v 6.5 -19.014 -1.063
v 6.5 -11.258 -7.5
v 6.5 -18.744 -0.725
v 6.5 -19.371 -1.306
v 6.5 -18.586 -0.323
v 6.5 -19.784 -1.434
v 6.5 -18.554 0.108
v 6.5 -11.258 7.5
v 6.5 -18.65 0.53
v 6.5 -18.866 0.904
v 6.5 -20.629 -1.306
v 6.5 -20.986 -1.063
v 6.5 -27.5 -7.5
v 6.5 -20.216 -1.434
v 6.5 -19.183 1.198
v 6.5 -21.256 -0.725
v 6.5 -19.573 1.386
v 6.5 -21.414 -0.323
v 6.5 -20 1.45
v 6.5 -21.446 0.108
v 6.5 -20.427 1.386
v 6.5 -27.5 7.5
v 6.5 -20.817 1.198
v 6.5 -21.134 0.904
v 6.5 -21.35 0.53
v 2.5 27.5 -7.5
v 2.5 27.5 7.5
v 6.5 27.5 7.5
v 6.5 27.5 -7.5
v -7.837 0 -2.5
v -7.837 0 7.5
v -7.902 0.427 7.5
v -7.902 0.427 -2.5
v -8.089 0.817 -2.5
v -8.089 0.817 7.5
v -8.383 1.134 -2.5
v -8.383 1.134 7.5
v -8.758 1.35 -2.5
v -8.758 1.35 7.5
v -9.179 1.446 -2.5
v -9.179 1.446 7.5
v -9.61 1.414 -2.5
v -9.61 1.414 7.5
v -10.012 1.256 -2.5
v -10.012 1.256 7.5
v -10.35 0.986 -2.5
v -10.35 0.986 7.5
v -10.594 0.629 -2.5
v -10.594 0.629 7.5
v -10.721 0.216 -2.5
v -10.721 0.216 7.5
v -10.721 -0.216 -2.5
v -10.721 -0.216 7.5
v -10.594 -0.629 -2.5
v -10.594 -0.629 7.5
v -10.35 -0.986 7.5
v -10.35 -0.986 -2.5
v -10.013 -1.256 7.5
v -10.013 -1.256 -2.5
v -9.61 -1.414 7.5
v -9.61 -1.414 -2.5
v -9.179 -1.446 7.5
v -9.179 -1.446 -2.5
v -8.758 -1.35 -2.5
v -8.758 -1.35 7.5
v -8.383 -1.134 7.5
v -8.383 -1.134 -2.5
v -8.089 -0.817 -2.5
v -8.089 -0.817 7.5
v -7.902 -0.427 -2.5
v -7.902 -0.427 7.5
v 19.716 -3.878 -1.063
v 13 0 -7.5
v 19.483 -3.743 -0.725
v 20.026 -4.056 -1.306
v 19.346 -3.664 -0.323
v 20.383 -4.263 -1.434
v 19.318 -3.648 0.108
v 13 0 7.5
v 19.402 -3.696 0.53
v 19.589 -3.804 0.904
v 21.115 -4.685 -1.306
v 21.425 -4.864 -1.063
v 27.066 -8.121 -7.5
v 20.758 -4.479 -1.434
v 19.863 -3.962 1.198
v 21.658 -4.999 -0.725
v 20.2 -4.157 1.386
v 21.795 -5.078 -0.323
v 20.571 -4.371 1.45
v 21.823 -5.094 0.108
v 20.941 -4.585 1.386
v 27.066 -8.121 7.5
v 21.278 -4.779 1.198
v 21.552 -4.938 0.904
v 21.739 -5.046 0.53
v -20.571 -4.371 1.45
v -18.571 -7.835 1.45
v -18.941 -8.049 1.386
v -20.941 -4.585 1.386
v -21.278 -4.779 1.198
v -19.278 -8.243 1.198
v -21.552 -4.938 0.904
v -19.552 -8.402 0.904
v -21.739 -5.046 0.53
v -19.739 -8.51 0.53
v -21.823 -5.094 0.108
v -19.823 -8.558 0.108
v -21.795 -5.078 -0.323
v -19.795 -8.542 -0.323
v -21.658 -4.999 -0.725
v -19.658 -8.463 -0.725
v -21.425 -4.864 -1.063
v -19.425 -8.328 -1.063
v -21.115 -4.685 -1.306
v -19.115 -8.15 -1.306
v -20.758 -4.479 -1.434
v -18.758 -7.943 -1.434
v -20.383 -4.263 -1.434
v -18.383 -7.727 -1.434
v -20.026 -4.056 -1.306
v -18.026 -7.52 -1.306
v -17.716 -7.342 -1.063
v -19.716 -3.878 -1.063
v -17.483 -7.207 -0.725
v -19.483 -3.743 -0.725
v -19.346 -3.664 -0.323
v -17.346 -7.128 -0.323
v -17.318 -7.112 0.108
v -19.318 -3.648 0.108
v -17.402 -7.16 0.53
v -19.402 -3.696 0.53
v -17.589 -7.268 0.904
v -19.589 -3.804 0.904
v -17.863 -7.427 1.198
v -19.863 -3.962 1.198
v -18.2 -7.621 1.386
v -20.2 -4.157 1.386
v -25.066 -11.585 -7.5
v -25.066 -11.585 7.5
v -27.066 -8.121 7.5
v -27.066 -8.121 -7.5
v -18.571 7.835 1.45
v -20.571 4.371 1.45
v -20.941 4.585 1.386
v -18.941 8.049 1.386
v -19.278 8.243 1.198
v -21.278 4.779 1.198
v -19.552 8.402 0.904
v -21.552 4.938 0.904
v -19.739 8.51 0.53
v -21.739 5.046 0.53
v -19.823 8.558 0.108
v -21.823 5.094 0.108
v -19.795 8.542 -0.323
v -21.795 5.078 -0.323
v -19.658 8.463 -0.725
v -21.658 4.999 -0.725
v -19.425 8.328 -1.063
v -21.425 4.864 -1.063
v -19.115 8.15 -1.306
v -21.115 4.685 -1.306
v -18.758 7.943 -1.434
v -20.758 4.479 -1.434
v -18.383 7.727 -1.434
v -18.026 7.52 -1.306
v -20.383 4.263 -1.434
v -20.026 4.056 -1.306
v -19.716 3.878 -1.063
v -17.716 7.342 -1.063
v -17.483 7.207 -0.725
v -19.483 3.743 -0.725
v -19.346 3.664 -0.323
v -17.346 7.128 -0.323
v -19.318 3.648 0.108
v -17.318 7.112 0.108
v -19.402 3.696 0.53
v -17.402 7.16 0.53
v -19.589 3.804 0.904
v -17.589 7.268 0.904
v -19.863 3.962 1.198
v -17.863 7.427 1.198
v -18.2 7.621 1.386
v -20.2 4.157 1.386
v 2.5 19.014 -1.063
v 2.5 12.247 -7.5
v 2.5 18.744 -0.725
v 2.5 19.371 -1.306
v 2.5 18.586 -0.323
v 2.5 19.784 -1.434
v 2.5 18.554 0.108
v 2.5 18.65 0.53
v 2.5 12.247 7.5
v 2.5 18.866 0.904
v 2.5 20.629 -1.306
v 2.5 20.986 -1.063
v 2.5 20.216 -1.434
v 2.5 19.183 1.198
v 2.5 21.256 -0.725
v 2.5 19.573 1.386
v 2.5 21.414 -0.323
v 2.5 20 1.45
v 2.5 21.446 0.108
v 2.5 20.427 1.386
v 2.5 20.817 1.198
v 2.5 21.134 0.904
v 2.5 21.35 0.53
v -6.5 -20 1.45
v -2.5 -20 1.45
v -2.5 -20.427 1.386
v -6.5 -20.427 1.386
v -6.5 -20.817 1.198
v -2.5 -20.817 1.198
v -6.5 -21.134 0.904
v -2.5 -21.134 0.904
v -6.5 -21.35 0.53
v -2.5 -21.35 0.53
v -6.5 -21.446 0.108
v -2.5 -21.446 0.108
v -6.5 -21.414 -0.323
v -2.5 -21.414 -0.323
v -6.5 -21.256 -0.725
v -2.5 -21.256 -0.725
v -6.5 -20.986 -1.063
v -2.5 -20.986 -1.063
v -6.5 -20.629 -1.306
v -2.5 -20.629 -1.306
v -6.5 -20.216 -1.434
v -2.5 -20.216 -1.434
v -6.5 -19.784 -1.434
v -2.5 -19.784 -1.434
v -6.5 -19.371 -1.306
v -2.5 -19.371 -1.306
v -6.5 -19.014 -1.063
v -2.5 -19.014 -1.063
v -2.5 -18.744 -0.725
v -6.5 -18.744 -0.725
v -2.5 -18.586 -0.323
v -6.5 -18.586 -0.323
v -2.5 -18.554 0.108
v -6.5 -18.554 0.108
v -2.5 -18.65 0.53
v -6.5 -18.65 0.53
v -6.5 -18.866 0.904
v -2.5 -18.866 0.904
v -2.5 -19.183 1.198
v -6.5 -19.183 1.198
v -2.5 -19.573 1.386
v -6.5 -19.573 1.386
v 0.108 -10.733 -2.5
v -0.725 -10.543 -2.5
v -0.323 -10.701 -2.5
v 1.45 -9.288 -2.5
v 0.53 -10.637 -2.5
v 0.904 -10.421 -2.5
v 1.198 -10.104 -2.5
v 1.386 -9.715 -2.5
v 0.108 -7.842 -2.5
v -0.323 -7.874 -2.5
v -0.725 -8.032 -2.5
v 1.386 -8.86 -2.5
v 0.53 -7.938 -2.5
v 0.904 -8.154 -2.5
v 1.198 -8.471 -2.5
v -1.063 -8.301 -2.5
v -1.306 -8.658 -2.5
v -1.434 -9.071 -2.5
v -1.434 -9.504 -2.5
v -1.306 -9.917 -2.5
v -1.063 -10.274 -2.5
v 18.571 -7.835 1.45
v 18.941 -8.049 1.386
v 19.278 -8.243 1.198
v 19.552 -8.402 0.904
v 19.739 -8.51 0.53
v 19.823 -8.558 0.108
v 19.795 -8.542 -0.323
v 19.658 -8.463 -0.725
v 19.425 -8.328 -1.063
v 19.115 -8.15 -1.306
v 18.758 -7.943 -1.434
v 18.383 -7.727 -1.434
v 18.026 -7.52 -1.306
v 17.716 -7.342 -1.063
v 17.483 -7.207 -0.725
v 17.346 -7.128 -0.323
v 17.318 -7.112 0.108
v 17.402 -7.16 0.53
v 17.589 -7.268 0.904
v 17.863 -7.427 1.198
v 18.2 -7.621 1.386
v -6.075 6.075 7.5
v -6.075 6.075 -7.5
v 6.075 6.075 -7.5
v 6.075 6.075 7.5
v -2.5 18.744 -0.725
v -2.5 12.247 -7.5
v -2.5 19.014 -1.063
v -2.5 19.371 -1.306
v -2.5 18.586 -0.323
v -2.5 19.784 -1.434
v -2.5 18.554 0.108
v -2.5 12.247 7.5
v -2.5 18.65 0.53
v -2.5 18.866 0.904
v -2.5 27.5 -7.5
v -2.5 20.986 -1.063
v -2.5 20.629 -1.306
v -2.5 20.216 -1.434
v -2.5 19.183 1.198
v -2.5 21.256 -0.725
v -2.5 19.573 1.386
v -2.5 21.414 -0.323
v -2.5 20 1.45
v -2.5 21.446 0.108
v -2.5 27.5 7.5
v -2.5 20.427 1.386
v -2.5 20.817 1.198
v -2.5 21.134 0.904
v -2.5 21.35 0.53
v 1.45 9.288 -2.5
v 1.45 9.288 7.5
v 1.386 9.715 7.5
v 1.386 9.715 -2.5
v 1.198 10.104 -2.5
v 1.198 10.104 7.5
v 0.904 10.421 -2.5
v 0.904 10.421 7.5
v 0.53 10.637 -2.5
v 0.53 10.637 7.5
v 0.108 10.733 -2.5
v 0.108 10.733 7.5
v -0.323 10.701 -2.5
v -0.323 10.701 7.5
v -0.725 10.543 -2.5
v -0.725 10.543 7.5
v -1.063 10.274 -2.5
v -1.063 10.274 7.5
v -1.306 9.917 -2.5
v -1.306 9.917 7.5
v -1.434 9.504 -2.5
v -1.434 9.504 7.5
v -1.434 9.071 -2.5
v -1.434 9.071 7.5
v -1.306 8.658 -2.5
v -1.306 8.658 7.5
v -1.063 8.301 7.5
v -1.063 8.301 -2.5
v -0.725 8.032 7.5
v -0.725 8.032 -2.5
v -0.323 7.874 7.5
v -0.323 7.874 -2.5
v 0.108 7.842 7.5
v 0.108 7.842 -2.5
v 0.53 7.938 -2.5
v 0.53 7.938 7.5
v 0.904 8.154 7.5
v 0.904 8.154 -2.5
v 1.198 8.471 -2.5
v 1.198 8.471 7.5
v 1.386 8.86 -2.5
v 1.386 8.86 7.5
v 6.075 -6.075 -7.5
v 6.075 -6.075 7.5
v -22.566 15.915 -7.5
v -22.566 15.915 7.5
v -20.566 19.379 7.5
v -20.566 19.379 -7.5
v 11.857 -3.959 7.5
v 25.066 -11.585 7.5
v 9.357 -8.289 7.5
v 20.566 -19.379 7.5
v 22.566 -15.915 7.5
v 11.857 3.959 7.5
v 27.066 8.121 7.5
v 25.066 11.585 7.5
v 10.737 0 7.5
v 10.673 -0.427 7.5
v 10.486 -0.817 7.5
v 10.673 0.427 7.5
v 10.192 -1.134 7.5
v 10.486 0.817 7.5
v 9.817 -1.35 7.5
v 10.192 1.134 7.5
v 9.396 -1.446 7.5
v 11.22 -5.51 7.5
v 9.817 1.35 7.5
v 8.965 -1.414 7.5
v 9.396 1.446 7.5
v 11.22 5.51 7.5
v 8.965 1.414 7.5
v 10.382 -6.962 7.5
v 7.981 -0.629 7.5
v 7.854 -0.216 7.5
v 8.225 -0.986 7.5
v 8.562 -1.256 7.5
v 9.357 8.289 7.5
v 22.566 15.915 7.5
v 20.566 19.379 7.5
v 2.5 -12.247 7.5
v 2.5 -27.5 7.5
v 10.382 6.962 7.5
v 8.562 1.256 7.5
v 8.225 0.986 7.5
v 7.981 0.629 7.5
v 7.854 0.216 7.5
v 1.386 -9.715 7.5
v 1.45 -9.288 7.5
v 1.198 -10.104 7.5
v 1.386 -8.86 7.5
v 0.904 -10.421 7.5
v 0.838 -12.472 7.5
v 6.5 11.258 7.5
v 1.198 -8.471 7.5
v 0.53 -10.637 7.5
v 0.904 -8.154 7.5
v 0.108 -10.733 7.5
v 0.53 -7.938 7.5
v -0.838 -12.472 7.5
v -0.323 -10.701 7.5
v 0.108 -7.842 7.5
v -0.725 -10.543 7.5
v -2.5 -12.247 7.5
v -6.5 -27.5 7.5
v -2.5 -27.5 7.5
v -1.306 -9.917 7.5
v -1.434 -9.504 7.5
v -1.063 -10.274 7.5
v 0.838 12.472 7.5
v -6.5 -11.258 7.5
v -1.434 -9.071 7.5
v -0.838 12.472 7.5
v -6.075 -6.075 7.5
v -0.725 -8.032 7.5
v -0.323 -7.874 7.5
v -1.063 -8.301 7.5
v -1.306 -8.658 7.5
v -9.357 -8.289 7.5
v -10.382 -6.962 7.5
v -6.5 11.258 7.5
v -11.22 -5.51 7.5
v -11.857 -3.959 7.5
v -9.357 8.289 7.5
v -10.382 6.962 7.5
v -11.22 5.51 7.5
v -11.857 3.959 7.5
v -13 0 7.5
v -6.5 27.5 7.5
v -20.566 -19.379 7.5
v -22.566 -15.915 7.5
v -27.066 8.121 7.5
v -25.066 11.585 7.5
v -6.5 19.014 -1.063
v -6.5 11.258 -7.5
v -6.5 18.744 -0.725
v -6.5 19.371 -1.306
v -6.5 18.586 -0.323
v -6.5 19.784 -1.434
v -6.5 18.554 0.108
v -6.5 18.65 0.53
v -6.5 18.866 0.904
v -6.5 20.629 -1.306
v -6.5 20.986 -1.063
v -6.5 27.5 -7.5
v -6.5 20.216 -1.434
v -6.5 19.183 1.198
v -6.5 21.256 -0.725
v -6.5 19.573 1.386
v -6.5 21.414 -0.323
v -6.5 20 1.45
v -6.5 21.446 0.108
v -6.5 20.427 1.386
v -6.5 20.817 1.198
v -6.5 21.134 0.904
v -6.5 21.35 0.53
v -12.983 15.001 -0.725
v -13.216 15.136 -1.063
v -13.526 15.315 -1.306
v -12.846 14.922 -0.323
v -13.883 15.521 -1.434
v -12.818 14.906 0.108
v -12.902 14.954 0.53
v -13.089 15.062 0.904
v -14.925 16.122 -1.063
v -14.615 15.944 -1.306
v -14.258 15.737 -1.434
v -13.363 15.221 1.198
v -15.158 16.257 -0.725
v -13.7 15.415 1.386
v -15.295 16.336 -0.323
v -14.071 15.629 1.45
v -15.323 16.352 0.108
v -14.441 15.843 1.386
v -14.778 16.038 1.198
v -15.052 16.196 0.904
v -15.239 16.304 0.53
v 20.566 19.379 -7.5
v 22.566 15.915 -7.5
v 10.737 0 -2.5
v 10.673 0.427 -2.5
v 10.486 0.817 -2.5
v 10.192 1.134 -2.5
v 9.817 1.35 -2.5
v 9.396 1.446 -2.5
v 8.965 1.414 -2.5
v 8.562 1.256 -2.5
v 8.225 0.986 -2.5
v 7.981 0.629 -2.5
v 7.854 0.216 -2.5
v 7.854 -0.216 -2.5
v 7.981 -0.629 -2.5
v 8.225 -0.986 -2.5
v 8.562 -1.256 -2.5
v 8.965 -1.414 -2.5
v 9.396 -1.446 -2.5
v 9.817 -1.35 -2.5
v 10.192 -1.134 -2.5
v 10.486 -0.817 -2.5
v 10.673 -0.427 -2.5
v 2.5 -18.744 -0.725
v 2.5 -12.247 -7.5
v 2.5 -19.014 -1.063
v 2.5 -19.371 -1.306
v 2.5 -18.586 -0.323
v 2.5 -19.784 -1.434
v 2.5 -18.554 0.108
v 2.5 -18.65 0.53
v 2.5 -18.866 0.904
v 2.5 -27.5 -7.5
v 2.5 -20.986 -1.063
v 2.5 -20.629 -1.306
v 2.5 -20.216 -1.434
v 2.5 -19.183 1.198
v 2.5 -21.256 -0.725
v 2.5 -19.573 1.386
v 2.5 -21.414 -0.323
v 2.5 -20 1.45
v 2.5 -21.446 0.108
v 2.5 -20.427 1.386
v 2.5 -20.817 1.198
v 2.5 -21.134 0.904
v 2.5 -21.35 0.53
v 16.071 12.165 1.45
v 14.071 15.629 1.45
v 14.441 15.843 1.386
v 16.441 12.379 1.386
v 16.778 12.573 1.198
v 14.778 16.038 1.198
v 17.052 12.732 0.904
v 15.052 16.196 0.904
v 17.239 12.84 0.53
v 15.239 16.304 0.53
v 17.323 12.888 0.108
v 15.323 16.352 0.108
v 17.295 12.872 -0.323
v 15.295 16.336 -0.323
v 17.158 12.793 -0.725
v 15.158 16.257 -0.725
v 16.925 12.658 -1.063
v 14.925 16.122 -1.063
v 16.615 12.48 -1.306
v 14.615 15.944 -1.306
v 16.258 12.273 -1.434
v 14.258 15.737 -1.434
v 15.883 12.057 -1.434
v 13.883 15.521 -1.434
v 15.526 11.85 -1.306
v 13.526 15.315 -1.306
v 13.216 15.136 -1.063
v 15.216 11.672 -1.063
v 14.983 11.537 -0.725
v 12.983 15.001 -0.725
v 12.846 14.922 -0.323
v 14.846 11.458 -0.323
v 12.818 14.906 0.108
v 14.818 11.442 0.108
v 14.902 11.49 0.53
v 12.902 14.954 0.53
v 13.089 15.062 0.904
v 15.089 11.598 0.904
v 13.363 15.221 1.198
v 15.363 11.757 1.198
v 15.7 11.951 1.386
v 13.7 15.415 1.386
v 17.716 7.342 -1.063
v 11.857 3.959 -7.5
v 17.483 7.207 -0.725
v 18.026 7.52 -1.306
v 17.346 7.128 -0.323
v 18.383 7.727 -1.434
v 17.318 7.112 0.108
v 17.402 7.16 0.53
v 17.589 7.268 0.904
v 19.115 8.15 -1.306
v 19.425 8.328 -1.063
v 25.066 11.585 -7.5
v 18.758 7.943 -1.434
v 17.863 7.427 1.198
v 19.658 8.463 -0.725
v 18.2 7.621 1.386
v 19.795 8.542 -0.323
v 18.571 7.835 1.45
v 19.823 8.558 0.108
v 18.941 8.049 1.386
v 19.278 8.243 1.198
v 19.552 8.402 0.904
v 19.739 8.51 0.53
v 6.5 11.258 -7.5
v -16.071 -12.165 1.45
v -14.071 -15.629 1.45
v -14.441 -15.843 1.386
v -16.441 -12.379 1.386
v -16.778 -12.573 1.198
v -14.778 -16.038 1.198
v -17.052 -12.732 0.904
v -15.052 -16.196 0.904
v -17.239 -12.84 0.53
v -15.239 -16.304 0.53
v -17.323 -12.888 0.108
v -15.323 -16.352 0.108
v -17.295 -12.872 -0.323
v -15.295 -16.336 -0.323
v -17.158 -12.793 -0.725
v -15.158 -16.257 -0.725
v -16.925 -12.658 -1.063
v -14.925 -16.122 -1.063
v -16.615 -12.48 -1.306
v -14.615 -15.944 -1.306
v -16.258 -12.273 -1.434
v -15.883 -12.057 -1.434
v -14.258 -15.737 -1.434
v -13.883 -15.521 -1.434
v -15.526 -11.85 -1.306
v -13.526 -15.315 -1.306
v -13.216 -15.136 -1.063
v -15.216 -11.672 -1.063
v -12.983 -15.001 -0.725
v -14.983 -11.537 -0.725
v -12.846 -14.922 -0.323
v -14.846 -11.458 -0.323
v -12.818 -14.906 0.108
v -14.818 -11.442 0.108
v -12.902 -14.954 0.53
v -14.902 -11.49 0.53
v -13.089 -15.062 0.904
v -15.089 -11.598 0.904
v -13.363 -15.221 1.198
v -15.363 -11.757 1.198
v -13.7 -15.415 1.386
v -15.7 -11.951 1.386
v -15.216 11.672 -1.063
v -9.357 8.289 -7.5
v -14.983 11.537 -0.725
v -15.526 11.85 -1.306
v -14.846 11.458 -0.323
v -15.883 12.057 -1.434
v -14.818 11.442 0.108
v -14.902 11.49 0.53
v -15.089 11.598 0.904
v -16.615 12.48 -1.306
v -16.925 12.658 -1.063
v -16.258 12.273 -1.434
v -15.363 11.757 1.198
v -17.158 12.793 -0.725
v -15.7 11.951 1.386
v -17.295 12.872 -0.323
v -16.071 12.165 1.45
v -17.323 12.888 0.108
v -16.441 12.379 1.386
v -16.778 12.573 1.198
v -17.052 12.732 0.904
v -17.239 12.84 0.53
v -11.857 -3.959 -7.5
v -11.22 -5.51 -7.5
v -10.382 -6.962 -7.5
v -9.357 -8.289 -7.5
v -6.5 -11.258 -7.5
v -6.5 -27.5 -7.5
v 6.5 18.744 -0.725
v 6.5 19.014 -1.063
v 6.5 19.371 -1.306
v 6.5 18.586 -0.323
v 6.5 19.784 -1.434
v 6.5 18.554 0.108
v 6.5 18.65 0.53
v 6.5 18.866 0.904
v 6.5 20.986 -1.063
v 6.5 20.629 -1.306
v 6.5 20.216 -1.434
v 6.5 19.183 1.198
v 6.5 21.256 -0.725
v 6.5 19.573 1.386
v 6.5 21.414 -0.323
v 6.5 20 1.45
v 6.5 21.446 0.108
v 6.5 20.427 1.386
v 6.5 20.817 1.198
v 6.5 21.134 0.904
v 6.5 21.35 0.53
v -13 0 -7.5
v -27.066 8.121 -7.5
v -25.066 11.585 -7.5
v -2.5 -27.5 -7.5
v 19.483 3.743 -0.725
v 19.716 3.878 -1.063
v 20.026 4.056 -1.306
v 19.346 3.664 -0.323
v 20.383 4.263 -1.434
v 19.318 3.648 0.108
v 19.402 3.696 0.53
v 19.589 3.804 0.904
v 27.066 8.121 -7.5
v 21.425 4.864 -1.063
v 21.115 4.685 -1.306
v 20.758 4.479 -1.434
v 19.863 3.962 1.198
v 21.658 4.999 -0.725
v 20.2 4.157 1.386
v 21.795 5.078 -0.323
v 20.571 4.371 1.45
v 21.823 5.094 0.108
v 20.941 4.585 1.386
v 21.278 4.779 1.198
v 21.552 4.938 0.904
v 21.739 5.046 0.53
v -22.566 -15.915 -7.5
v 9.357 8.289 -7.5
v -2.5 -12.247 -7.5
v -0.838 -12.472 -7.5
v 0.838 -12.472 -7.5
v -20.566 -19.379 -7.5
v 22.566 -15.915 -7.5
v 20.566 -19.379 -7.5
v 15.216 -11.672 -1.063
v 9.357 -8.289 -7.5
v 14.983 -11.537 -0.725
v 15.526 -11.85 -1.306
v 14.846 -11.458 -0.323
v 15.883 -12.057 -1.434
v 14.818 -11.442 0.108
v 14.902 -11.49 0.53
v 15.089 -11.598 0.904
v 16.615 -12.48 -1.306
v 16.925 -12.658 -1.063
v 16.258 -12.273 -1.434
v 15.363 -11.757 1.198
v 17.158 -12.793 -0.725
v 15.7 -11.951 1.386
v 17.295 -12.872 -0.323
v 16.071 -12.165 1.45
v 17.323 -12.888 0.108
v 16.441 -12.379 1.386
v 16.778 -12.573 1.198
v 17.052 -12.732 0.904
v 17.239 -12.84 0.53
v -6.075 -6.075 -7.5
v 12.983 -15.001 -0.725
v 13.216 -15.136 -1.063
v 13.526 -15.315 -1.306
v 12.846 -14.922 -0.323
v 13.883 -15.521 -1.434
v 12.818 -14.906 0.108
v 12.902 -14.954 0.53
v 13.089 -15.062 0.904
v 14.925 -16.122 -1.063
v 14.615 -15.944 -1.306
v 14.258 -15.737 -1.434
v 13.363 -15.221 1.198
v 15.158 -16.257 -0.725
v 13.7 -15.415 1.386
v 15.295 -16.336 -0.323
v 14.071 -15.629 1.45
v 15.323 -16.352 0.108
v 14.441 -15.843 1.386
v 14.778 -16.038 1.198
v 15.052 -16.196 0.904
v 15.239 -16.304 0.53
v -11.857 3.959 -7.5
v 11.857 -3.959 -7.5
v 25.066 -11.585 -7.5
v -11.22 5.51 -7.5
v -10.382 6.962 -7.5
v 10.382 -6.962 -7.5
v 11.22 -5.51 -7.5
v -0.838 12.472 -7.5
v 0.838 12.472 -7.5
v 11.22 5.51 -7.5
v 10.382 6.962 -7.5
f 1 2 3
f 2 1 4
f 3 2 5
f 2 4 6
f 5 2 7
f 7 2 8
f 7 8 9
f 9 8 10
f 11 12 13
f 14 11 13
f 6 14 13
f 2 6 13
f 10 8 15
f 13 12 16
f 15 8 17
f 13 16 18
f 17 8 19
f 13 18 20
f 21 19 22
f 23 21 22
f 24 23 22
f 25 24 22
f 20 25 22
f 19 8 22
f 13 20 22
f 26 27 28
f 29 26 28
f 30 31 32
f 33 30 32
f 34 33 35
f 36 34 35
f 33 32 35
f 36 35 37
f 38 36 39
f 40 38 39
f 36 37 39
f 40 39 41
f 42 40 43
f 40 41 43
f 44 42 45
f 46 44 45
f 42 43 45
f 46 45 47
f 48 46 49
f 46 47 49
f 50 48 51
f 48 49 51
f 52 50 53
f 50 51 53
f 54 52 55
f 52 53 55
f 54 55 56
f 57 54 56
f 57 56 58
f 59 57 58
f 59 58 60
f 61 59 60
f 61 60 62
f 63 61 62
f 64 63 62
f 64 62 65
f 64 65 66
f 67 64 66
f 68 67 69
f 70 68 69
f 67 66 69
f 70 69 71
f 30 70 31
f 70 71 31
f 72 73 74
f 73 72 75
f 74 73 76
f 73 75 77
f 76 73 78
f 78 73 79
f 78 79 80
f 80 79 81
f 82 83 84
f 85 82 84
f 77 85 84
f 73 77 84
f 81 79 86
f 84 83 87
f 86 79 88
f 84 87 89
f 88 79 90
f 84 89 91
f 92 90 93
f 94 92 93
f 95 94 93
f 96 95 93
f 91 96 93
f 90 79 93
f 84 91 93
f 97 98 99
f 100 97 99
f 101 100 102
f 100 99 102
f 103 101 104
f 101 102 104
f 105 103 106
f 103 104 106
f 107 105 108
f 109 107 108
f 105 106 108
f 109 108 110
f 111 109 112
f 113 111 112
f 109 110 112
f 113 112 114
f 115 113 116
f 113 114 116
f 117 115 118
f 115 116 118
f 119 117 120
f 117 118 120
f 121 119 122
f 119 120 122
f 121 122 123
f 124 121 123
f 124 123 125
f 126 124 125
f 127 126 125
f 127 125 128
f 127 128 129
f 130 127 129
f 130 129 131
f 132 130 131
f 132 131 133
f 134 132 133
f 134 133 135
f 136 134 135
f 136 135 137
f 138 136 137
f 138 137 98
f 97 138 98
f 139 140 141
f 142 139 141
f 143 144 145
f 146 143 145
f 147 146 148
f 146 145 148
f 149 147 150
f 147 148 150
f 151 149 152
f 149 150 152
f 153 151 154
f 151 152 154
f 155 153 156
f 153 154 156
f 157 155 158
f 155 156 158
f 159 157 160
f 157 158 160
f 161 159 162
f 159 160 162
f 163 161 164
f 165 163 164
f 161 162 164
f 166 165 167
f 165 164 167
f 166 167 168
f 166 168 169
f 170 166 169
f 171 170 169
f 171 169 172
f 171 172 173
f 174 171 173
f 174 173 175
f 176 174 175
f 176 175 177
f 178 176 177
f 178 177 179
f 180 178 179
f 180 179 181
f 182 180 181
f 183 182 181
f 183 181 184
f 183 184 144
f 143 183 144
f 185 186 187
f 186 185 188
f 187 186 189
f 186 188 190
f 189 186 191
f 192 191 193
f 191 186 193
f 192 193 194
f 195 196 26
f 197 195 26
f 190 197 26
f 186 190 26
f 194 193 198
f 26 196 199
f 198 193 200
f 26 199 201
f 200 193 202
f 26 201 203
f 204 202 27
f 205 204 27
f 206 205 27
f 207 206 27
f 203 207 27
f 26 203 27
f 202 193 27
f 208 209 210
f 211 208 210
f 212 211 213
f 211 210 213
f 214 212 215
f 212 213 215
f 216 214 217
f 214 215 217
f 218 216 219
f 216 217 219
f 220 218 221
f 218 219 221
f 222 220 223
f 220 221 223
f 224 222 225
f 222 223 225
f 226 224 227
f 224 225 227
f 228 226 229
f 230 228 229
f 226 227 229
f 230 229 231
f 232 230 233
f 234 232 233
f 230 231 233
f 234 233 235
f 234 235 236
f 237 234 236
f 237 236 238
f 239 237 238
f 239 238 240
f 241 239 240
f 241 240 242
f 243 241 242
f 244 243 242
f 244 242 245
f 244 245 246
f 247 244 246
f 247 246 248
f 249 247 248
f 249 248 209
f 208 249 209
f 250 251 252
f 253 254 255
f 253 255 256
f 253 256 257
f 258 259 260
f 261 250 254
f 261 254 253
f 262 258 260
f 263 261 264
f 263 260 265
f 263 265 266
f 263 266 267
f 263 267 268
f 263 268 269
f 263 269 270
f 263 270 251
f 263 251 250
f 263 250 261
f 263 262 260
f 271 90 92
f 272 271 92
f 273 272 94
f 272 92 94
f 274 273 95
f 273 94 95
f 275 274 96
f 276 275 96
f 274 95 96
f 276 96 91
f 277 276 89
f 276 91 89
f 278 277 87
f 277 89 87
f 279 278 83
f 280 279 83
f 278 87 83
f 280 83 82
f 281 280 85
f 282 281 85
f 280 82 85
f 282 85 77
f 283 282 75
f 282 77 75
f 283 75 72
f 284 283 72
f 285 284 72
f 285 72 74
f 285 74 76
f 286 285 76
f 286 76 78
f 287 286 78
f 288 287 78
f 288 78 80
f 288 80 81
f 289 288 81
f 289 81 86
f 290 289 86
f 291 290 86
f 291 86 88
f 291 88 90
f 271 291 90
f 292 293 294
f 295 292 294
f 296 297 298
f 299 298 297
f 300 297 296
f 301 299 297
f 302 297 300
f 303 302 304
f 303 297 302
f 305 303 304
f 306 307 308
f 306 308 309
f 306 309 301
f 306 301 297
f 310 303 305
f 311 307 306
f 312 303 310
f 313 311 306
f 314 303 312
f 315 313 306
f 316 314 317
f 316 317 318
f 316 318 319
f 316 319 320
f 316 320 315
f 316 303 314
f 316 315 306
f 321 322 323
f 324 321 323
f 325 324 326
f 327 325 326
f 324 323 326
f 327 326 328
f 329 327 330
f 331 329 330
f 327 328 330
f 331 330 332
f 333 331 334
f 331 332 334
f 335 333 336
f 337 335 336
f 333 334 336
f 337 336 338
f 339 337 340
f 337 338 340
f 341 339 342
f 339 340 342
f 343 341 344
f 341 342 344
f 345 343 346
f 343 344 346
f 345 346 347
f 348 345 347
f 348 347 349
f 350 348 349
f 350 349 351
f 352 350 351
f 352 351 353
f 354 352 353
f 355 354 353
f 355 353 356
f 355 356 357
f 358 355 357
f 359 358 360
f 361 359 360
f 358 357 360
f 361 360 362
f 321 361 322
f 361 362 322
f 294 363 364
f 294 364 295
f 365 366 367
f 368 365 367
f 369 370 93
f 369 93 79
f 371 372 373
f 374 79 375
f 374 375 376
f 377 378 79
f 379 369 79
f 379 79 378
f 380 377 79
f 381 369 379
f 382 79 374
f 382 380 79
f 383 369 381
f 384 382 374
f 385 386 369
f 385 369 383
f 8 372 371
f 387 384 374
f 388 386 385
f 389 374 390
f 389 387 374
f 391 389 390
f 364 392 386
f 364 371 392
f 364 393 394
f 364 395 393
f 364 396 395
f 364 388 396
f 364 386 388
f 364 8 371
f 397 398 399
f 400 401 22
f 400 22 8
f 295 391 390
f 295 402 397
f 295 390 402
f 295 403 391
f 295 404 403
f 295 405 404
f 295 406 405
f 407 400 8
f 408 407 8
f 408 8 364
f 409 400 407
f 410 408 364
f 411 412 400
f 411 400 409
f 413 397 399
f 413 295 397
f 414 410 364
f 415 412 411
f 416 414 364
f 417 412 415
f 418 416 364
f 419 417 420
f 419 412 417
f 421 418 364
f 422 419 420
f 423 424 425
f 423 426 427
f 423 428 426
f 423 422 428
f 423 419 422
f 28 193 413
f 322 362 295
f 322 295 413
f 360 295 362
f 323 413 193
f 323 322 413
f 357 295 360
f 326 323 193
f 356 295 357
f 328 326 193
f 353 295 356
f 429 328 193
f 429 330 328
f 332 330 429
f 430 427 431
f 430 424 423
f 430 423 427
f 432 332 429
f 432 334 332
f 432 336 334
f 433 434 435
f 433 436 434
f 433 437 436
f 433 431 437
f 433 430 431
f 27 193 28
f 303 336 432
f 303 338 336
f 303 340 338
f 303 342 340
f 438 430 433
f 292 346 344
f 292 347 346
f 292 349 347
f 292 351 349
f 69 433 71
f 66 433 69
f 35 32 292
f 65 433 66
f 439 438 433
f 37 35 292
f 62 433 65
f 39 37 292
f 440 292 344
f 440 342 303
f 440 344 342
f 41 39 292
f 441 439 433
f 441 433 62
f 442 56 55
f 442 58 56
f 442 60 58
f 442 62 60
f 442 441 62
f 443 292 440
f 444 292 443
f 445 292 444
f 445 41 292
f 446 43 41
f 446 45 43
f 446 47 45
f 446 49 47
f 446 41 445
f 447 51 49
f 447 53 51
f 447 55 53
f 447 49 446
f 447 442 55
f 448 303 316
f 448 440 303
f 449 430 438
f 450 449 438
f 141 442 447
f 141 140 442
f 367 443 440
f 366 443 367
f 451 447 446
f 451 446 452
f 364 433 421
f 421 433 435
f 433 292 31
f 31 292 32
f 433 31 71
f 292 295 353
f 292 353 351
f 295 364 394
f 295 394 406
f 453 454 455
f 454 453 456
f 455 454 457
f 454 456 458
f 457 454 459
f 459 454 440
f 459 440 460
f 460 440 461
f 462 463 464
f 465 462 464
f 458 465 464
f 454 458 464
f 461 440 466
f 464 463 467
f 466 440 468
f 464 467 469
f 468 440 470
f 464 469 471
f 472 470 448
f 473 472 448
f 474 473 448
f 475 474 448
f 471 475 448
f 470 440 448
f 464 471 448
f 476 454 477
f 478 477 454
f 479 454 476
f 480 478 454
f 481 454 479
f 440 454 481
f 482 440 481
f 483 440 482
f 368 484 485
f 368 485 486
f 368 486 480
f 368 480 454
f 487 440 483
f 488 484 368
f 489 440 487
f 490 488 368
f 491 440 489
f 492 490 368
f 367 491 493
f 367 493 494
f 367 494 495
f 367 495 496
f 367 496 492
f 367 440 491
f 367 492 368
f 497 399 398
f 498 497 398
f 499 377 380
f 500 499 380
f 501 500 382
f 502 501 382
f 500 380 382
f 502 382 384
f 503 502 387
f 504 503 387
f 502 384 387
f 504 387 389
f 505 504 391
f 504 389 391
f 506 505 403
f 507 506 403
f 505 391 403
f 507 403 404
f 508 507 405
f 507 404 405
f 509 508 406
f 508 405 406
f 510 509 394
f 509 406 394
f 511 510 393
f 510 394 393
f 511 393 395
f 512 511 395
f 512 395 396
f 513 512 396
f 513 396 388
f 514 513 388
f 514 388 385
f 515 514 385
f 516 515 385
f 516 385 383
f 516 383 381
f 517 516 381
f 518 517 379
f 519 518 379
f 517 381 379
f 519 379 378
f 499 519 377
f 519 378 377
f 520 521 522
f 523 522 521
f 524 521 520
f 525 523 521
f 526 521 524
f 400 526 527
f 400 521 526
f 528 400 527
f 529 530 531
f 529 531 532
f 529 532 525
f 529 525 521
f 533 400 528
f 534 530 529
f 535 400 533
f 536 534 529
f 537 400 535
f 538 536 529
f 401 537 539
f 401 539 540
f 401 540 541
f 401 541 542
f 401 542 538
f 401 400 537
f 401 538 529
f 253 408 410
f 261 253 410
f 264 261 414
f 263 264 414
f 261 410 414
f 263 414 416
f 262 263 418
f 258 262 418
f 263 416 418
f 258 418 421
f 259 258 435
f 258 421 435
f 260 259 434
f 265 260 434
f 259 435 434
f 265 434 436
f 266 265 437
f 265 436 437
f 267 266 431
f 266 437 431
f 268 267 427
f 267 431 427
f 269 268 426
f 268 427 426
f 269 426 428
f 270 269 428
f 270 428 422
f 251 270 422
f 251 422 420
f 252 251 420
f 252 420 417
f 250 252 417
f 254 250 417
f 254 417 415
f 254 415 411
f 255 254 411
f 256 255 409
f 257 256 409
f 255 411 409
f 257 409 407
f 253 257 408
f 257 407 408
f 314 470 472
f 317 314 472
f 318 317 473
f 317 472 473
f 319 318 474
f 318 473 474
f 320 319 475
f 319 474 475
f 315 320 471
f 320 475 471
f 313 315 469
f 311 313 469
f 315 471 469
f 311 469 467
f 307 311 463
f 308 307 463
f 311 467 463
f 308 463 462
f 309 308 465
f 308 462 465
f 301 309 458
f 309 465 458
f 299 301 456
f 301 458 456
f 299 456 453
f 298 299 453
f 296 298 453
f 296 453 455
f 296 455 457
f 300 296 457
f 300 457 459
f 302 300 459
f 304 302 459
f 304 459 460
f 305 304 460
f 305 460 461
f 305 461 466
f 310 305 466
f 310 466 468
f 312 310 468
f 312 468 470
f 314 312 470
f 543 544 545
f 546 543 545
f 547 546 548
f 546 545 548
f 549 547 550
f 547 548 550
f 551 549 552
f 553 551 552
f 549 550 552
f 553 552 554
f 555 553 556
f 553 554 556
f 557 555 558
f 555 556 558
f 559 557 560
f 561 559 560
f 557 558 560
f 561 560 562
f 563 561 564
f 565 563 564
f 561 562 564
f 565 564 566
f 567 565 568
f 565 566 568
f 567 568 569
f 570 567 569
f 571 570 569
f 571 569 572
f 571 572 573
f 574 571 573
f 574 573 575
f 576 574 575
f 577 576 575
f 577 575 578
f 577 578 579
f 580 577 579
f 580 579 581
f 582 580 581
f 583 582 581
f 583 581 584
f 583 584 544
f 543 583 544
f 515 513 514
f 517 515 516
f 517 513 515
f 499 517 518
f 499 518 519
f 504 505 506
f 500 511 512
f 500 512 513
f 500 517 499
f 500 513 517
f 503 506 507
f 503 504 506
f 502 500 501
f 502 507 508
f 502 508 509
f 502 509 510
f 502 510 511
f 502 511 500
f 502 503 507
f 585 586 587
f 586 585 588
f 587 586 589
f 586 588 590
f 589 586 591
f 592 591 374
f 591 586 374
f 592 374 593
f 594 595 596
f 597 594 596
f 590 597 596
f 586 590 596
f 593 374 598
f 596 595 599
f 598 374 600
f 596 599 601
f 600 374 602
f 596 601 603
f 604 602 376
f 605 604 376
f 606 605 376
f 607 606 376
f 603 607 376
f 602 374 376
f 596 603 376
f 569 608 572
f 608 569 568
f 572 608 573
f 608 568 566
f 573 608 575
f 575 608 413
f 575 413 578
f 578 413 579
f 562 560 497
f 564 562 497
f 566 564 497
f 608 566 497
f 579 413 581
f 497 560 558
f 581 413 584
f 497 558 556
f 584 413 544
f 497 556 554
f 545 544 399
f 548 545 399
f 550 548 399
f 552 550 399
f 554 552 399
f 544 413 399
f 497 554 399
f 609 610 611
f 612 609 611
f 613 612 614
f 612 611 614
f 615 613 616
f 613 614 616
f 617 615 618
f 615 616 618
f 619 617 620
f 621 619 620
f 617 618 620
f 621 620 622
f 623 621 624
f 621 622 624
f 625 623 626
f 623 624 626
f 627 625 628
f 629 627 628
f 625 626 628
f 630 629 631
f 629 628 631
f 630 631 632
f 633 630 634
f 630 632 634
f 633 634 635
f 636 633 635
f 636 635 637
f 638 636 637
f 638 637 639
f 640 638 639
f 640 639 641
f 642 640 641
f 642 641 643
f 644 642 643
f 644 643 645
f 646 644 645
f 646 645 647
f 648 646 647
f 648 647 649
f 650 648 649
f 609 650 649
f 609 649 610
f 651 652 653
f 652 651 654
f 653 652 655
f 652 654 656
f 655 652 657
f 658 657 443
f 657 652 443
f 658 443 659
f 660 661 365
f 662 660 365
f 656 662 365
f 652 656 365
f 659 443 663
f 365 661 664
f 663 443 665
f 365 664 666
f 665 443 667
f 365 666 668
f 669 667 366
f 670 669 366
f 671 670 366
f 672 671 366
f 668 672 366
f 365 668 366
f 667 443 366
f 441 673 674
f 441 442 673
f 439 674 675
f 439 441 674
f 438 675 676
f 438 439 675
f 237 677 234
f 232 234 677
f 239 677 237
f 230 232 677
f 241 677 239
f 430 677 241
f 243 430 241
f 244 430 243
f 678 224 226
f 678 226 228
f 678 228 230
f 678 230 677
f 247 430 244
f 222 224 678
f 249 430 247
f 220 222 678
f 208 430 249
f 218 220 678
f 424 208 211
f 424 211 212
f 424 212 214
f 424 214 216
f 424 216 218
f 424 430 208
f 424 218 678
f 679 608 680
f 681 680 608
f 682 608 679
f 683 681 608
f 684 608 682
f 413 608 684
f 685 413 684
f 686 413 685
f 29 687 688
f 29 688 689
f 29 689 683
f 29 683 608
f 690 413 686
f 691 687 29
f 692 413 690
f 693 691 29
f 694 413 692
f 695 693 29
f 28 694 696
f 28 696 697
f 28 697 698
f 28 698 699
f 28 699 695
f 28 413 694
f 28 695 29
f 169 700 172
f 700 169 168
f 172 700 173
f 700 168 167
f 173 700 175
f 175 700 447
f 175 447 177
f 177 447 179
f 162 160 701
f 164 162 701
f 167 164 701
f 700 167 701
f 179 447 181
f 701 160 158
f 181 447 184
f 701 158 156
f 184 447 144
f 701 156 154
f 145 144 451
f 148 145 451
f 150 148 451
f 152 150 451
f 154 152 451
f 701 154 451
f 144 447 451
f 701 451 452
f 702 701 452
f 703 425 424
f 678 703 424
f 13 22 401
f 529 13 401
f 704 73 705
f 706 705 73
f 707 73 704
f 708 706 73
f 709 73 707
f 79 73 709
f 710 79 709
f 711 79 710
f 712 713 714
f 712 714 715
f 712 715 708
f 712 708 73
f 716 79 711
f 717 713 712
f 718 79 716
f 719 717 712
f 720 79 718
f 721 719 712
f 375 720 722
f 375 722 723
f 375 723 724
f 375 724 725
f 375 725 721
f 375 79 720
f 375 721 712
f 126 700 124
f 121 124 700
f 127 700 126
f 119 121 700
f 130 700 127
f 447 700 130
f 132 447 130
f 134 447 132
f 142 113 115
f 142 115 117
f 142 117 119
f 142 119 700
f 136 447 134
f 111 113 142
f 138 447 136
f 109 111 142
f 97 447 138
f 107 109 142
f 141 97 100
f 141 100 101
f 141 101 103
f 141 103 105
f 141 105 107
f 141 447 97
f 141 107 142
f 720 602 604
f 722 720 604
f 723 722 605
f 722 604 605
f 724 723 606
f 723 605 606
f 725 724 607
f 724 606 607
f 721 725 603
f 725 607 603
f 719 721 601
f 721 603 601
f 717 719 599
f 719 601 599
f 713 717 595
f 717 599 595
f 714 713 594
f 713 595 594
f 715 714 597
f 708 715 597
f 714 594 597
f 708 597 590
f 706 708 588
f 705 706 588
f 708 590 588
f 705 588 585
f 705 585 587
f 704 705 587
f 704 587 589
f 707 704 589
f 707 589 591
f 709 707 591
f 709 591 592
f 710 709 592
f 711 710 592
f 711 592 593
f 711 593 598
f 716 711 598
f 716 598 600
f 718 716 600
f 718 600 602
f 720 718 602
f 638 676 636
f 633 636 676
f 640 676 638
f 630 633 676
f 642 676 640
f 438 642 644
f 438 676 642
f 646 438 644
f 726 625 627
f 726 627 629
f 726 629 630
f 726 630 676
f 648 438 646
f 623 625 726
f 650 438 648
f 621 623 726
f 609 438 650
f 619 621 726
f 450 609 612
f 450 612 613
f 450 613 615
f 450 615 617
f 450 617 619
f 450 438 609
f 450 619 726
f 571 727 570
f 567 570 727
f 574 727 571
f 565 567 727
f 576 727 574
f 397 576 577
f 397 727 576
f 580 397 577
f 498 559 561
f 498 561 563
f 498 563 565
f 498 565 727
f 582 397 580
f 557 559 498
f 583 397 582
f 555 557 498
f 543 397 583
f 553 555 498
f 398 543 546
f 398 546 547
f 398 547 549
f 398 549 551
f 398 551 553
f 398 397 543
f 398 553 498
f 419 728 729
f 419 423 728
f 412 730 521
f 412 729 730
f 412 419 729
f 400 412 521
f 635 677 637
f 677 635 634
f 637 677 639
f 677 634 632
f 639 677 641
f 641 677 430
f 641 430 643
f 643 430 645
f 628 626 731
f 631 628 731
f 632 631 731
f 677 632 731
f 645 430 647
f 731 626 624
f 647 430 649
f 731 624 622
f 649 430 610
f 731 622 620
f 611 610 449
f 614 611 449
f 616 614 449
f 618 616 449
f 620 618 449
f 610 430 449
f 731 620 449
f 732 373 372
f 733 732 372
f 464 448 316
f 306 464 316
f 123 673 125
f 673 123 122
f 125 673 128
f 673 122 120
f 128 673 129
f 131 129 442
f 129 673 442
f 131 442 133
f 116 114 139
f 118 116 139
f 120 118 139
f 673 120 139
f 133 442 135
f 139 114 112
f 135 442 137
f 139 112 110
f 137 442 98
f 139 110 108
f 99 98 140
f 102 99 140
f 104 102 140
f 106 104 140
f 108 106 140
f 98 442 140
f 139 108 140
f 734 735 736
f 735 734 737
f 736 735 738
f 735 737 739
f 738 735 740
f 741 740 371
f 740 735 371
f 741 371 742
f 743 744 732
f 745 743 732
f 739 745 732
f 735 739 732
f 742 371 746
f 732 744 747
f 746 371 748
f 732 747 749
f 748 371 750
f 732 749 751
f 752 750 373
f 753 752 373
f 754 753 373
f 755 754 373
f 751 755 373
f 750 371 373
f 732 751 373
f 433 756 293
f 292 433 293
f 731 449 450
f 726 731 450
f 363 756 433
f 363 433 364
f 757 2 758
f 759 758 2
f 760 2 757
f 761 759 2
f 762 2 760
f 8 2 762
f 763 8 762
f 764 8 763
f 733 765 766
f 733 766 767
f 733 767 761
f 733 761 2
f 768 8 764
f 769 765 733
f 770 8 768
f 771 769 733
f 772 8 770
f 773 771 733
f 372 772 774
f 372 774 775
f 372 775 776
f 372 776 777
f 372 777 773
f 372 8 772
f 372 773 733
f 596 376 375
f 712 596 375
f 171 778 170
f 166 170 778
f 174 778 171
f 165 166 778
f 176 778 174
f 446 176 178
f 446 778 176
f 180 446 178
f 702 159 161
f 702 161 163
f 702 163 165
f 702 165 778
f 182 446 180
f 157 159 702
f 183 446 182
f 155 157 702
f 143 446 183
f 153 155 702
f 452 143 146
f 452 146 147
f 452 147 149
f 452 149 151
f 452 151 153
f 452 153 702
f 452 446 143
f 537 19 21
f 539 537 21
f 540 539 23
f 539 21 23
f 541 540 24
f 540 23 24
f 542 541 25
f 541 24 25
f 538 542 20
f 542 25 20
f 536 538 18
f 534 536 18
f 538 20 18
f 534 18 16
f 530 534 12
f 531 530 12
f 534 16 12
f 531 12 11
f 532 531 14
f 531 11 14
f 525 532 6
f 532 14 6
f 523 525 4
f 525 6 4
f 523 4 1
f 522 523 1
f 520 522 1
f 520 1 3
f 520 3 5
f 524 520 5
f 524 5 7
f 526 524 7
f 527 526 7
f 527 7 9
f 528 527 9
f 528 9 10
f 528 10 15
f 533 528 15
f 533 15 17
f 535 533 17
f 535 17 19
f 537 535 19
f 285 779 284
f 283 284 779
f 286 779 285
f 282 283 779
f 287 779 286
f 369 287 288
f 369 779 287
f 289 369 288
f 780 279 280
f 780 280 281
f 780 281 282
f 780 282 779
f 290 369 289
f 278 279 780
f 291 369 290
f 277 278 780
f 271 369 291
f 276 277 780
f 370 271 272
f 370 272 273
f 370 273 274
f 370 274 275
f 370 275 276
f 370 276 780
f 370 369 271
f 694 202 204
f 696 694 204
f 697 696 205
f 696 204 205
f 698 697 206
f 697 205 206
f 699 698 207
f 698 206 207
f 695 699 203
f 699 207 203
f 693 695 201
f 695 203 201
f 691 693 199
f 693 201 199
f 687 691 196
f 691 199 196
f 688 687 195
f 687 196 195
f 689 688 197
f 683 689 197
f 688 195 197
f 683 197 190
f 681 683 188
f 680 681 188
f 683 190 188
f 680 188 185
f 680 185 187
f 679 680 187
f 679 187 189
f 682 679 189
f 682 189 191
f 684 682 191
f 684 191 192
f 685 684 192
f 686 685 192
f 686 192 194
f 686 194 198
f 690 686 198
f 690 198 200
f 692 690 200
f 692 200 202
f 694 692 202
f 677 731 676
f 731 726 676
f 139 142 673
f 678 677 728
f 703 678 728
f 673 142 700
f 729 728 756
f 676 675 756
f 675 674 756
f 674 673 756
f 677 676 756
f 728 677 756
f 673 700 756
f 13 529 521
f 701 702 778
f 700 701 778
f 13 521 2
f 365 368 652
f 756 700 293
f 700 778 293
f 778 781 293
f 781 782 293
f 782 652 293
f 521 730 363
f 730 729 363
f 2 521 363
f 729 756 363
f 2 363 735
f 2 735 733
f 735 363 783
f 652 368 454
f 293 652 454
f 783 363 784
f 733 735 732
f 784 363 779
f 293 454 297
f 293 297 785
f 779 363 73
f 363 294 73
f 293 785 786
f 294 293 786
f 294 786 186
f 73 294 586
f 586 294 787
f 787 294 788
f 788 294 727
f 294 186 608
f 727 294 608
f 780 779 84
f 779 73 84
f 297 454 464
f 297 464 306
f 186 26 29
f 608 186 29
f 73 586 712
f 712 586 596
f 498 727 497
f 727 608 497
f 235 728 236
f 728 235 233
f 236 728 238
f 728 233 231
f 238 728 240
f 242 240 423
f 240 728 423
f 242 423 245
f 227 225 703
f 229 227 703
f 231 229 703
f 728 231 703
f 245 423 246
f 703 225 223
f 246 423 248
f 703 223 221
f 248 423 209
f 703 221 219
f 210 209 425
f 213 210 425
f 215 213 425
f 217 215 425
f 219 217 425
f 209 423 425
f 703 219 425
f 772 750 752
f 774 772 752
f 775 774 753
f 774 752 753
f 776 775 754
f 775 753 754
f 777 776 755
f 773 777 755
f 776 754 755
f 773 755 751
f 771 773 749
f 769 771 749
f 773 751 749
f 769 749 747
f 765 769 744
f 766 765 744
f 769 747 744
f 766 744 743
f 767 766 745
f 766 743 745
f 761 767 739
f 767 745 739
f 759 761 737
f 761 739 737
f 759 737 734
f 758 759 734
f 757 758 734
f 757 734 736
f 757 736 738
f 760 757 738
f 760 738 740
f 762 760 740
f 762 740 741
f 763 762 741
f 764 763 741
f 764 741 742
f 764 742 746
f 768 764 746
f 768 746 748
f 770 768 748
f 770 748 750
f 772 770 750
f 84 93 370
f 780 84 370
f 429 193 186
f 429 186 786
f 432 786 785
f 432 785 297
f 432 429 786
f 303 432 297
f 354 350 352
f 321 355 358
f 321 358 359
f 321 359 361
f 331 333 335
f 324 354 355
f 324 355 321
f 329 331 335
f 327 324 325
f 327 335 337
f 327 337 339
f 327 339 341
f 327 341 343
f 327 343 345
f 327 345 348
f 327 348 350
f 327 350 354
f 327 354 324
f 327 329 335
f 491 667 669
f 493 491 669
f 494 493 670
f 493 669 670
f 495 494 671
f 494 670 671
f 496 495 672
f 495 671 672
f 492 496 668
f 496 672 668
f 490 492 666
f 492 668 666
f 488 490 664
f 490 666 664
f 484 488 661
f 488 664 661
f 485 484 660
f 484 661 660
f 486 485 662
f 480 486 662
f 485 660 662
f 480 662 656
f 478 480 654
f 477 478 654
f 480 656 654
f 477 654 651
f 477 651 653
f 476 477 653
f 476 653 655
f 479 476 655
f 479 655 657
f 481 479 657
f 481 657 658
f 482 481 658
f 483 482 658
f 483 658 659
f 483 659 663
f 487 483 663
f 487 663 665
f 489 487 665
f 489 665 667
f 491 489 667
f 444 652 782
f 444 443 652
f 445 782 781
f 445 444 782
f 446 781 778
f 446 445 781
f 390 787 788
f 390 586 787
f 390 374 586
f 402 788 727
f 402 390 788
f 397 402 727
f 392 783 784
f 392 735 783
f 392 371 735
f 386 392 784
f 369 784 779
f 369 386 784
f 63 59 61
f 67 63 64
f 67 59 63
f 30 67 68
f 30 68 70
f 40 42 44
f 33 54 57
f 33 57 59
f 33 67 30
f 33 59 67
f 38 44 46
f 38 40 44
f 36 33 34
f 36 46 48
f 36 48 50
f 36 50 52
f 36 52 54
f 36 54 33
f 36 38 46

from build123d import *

# Parameters (mm, degrees)
SKETCH1_R           = 12.5
BOSS_EXTRUDE1_DEPTH = 7.5
SKETCH4_W           = 4
SKETCH4_H           = 27.5
BOSS_EXTRUDE3_DEPTH = 15
CIRPATTERN7_COUNT   = 6
SKETCH7_R           = 1.45
CUT_EXTRUDE2_DEPTH  = 17
CIRPATTERN9_COUNT   = 6
CUT_EXTRUDE3_REACH  = 43.398
SKETCH8_W           = 12.15
SKETCH8_H           = 12.15
SKETCH9_R           = 1.45
CUT_EXTRUDE4_DEPTH  = 10


with BuildPart() as part:
    # Sketch1 → Boss-Extrude1 (new, symmetric)
    with BuildSketch(Plane.XY):
        Circle(SKETCH1_R)
    extrude(amount=BOSS_EXTRUDE1_DEPTH, both=True)

    # Sketch4 → Boss-Extrude3 (add)
    with BuildSketch(Plane.XY.offset(7.5)):
        with Locations((-4.5, 13.75)):
            Rectangle(SKETCH4_W, SKETCH4_H)
        with Locations((4.5, 13.75)):
            Rectangle(SKETCH4_W, SKETCH4_H)
    boss_extrude3 = extrude(amount=-BOSS_EXTRUDE3_DEPTH)

    # CirPattern7: Boss-Extrude3 ×6 about axis
    cirpattern7_axis = Axis((0, 0, 0), (0, 0, 1))
    for i in range(1, CIRPATTERN7_COUNT):
        add(boss_extrude3.rotate(cirpattern7_axis, i * 360 / CIRPATTERN7_COUNT))

    # Sketch7 → Cut-Extrude2 (cut)
    with BuildSketch(Plane.ZY.offset(6.5)):
        with Locations((0, 20)):
            Circle(SKETCH7_R)
        with Locations((40, 20)):
            Circle(SKETCH7_R)
        with Locations((80, 20)):
            Circle(SKETCH7_R)
        with Locations((120, 20)):
            Circle(SKETCH7_R)
        with Locations((160, 20)):
            Circle(SKETCH7_R)
    cut_extrude2 = extrude(amount=-CUT_EXTRUDE2_DEPTH, mode=Mode.SUBTRACT)

    # CirPattern9: Cut-Extrude2 ×6 about axis
    cirpattern9_axis = Axis((0, 0, 0), (0, 0, 1))
    for i in range(1, CIRPATTERN9_COUNT):
        add(cut_extrude2.rotate(cirpattern9_axis, i * 360 / CIRPATTERN9_COUNT), mode=Mode.SUBTRACT)

    # Sketch8 → Cut-Extrude3 (cut, up to next)
    with BuildSketch(Plane.XY.offset(7.5), mode=Mode.PRIVATE) as cut_extrude3_sk1:
        Rectangle(SKETCH8_W, SKETCH8_H)
    cut_extrude3_tool1 = extrude(cut_extrude3_sk1.sketch, amount=-CUT_EXTRUDE3_REACH, mode=Mode.PRIVATE) & part.part
    add(cut_extrude3_tool1.solids().sort_by_distance((0, 0, 7.5))[0], mode=Mode.SUBTRACT)

    # Sketch9 → Cut-Extrude4 (cut)
    with BuildSketch(Plane.XY.offset(7.5)):
        with Locations((9.2875, 0)):
            Circle(SKETCH9_R)
        with Locations((0, -9.2875)):
            Circle(SKETCH9_R)
        with Locations((-9.2875, 0)):
            Circle(SKETCH9_R)
        with Locations((0, 9.2875)):
            Circle(SKETCH9_R)
    extrude(amount=-CUT_EXTRUDE4_DEPTH, mode=Mode.SUBTRACT)


solid = part.part
